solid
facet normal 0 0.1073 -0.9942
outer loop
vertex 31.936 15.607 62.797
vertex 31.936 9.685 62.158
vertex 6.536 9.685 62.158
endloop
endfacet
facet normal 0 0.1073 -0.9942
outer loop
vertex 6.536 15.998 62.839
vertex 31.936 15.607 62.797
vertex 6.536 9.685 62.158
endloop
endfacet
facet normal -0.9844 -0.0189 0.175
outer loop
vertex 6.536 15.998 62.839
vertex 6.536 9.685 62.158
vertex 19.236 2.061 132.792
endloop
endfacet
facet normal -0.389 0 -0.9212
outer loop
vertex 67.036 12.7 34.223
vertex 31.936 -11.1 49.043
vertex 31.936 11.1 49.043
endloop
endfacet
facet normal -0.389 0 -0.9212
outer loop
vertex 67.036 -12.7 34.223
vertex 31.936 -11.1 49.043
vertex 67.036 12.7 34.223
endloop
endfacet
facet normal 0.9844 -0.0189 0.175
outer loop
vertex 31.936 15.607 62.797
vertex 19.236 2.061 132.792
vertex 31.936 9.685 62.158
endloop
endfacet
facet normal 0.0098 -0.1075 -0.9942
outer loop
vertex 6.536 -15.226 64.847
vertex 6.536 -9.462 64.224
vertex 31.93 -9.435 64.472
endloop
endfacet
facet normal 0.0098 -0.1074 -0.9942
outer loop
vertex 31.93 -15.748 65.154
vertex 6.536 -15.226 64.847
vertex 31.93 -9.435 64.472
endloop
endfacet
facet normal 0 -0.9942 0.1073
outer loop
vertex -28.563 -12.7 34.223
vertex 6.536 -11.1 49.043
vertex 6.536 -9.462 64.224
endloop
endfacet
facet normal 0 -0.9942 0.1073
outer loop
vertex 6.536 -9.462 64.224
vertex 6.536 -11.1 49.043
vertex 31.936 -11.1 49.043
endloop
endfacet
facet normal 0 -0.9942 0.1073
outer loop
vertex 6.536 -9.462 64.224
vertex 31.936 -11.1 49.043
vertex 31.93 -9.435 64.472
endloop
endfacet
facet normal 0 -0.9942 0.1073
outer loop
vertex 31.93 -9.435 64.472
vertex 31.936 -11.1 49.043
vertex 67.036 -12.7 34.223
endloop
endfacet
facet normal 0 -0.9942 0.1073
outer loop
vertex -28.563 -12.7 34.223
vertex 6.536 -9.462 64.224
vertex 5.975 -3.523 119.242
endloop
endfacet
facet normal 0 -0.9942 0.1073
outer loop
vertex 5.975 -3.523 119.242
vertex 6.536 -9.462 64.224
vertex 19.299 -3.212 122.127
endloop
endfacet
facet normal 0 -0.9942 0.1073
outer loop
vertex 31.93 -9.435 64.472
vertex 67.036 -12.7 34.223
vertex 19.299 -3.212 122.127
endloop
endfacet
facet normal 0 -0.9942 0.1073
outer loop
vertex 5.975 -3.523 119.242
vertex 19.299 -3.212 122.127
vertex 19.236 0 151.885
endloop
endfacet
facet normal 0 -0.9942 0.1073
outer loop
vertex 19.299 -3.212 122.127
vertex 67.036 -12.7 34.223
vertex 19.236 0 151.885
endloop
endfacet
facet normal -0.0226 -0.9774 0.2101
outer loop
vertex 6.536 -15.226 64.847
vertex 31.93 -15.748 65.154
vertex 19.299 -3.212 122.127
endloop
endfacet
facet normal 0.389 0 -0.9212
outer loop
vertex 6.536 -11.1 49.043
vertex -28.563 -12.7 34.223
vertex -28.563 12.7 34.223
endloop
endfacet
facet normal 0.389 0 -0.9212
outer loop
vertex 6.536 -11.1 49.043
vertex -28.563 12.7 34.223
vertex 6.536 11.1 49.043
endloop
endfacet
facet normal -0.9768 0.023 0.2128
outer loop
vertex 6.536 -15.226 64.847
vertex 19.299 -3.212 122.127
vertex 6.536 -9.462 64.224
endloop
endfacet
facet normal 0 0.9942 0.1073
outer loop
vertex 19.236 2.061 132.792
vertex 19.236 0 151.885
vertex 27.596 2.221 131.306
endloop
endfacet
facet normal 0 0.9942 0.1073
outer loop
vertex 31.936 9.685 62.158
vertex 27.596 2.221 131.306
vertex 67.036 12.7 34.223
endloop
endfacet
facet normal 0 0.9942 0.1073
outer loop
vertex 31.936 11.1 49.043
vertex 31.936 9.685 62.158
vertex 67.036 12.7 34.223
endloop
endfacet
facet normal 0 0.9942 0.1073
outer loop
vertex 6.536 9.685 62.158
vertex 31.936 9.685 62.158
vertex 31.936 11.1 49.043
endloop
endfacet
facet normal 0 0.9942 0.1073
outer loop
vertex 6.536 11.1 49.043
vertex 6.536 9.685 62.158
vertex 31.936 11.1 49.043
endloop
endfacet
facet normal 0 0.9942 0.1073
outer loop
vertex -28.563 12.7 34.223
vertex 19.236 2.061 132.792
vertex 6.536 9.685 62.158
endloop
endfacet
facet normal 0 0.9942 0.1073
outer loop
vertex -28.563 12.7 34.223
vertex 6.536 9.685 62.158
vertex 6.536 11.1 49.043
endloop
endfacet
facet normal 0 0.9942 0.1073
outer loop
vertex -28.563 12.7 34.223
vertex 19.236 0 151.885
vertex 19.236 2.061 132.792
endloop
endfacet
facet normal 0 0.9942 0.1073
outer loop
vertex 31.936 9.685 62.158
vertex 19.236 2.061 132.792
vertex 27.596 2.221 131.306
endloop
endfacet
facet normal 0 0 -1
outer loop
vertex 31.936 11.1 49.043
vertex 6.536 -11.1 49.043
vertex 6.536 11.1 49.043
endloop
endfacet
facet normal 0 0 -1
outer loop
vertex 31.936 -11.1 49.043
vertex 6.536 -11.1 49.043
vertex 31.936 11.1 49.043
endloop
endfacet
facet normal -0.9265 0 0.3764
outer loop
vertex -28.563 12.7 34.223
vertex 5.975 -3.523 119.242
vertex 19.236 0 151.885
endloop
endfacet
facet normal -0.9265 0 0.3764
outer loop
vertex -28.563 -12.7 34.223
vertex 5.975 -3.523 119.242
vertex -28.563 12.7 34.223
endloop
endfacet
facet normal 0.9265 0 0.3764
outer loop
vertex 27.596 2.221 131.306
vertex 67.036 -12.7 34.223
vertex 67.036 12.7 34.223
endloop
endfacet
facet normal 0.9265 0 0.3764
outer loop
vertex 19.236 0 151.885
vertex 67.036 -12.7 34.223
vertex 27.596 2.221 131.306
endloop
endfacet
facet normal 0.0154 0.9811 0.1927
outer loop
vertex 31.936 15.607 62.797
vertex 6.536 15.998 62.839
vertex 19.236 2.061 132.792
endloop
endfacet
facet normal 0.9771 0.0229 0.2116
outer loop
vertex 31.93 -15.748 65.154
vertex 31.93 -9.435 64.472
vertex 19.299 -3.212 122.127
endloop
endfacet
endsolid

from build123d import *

# Parameters (mm, degrees)
F3_DEPTH  = 12.7
F5_DEPTH  = 67.0368353671
F6_DEPTH  = 28.5643014728
F8_DEPTH  = 6.35
F10_DEPTH = 64.56300866
F12_DEPTH = 6.35
F14_DEPTH = 65.6539037047


# Not quite as in the source:
# - the program builds the solid bodies; features that only make, move or delete a surface that nothing else refers to are left out


with BuildPart() as f3:
    # F2 (on Front) → F3 (new body, symmetric)
    with BuildSketch(Plane.XZ):
        Polygon((-28.5633014728, 34.2233732831), (6.5362669471, 49.0433023226), (31.9362669471, 49.0433023226), (67.0358353671, 34.2233732831), (19.2362669471, 151.884757173), align=None)
    extrude(amount=F3_DEPTH, both=True)

    # F4 (on Right) → F5 (cut, through all)
    with BuildSketch(Plane.YZ):
        Polygon((-12.7, 151.884757173), (-12.7, 49.0433023226), (-11.1003834344, 49.0433023226), (0, 151.884757173), align=None)
        Polygon((11.1003834344, 49.0433023226), (12.7, 49.0433023226), (12.7, 151.884757173), (0, 151.884757173), align=None)
        Polygon((-12.7, 49.0433023226), (-12.7, 34.2233732831), (-11.1003834344, 49.0433023226), align=None)
        Polygon((11.1003834344, 49.0433023226), (12.7, 34.2233732831), (12.7, 49.0433023226), align=None)
    extrude(amount=F5_DEPTH, mode=Mode.SUBTRACT)

    # F4 (on Right) → F6 (cut, through all)
    with BuildSketch(Plane.YZ):
        Polygon((-12.7, 151.884757173), (-12.7, 49.0433023226), (-11.1003834344, 49.0433023226), (0, 151.884757173), align=None)
        Polygon((11.1003834344, 49.0433023226), (12.7, 49.0433023226), (12.7, 151.884757173), (0, 151.884757173), align=None)
        Polygon((11.1003834344, 49.0433023226), (12.7, 34.2233732831), (12.7, 49.0433023226), align=None)
        Polygon((-12.7, 49.0433023226), (-12.7, 34.2233732831), (-11.1003834344, 49.0433023226), align=None)
    extrude(amount=-F6_DEPTH, mode=Mode.SUBTRACT)

    # F7 (on face) → F8 (join)
    with BuildSketch(Plane(origin=(0, 16.2051672418, 1.7491348237), x_dir=(-1, 0, 0), z_dir=(0, 0.9942252274, 0.1073135465))):
        Polygon((-6.5362669471, 60.7595853508), (-19.2362669471, 131.8038254976), (-31.9362669471, 60.7595853508), align=None)
    extrude(amount=F8_DEPTH)

    # F9 (on face) → F10 (cut, through all)
    with BuildSketch(Plane(origin=(-4.1912929855, -0.0804039557, 0.7449165901), x_dir=(0.0185928408, -0.9998216774, -0.0033044971), z_dir=(-0.9843951195, -0.0188842111, 0.1749560955))):
        Polygon((-15.6091843346, 67.4581627004), (-16.0814424902, 63.0134852894), (-2.1416171439, 134.1090394919), (-8.4560733481, 134.7799663477), align=None)
    extrude(amount=-F10_DEPTH, mode=Mode.SUBTRACT)

    # F11 (on face) → F12 (join)
    with BuildSketch(Plane(origin=(0, -16.2051672418, 1.7491348237), x_dir=(1, 0, 0), z_dir=(0, -0.9942252274, 0.1073135465))):
        Polygon((19.2987158189, 121.0772431274), (6.5362669471, 62.8382145463), (31.9300841439, 63.0873250248), align=None)
    extrude(amount=F12_DEPTH)

    # F13 (on face) → F14 (cut, through all)
    with BuildSketch(Plane(origin=(43.6030001695, 1.019222081, 9.442762247), x_dir=(-0.0223220606, 0.9997391444, -0.0048341149), z_dir=(0.9770893164, 0.0228395065, 0.2116006255))):
        Polygon((-16.230656346, 62.0519835601), (-16.7719699924, 56.9192946566), (-4.2322649759, 115.2756170682), (-10.5472424667, 115.9416195391), align=None)
    extrude(amount=-F14_DEPTH, mode=Mode.SUBTRACT)


solid = f3.part
